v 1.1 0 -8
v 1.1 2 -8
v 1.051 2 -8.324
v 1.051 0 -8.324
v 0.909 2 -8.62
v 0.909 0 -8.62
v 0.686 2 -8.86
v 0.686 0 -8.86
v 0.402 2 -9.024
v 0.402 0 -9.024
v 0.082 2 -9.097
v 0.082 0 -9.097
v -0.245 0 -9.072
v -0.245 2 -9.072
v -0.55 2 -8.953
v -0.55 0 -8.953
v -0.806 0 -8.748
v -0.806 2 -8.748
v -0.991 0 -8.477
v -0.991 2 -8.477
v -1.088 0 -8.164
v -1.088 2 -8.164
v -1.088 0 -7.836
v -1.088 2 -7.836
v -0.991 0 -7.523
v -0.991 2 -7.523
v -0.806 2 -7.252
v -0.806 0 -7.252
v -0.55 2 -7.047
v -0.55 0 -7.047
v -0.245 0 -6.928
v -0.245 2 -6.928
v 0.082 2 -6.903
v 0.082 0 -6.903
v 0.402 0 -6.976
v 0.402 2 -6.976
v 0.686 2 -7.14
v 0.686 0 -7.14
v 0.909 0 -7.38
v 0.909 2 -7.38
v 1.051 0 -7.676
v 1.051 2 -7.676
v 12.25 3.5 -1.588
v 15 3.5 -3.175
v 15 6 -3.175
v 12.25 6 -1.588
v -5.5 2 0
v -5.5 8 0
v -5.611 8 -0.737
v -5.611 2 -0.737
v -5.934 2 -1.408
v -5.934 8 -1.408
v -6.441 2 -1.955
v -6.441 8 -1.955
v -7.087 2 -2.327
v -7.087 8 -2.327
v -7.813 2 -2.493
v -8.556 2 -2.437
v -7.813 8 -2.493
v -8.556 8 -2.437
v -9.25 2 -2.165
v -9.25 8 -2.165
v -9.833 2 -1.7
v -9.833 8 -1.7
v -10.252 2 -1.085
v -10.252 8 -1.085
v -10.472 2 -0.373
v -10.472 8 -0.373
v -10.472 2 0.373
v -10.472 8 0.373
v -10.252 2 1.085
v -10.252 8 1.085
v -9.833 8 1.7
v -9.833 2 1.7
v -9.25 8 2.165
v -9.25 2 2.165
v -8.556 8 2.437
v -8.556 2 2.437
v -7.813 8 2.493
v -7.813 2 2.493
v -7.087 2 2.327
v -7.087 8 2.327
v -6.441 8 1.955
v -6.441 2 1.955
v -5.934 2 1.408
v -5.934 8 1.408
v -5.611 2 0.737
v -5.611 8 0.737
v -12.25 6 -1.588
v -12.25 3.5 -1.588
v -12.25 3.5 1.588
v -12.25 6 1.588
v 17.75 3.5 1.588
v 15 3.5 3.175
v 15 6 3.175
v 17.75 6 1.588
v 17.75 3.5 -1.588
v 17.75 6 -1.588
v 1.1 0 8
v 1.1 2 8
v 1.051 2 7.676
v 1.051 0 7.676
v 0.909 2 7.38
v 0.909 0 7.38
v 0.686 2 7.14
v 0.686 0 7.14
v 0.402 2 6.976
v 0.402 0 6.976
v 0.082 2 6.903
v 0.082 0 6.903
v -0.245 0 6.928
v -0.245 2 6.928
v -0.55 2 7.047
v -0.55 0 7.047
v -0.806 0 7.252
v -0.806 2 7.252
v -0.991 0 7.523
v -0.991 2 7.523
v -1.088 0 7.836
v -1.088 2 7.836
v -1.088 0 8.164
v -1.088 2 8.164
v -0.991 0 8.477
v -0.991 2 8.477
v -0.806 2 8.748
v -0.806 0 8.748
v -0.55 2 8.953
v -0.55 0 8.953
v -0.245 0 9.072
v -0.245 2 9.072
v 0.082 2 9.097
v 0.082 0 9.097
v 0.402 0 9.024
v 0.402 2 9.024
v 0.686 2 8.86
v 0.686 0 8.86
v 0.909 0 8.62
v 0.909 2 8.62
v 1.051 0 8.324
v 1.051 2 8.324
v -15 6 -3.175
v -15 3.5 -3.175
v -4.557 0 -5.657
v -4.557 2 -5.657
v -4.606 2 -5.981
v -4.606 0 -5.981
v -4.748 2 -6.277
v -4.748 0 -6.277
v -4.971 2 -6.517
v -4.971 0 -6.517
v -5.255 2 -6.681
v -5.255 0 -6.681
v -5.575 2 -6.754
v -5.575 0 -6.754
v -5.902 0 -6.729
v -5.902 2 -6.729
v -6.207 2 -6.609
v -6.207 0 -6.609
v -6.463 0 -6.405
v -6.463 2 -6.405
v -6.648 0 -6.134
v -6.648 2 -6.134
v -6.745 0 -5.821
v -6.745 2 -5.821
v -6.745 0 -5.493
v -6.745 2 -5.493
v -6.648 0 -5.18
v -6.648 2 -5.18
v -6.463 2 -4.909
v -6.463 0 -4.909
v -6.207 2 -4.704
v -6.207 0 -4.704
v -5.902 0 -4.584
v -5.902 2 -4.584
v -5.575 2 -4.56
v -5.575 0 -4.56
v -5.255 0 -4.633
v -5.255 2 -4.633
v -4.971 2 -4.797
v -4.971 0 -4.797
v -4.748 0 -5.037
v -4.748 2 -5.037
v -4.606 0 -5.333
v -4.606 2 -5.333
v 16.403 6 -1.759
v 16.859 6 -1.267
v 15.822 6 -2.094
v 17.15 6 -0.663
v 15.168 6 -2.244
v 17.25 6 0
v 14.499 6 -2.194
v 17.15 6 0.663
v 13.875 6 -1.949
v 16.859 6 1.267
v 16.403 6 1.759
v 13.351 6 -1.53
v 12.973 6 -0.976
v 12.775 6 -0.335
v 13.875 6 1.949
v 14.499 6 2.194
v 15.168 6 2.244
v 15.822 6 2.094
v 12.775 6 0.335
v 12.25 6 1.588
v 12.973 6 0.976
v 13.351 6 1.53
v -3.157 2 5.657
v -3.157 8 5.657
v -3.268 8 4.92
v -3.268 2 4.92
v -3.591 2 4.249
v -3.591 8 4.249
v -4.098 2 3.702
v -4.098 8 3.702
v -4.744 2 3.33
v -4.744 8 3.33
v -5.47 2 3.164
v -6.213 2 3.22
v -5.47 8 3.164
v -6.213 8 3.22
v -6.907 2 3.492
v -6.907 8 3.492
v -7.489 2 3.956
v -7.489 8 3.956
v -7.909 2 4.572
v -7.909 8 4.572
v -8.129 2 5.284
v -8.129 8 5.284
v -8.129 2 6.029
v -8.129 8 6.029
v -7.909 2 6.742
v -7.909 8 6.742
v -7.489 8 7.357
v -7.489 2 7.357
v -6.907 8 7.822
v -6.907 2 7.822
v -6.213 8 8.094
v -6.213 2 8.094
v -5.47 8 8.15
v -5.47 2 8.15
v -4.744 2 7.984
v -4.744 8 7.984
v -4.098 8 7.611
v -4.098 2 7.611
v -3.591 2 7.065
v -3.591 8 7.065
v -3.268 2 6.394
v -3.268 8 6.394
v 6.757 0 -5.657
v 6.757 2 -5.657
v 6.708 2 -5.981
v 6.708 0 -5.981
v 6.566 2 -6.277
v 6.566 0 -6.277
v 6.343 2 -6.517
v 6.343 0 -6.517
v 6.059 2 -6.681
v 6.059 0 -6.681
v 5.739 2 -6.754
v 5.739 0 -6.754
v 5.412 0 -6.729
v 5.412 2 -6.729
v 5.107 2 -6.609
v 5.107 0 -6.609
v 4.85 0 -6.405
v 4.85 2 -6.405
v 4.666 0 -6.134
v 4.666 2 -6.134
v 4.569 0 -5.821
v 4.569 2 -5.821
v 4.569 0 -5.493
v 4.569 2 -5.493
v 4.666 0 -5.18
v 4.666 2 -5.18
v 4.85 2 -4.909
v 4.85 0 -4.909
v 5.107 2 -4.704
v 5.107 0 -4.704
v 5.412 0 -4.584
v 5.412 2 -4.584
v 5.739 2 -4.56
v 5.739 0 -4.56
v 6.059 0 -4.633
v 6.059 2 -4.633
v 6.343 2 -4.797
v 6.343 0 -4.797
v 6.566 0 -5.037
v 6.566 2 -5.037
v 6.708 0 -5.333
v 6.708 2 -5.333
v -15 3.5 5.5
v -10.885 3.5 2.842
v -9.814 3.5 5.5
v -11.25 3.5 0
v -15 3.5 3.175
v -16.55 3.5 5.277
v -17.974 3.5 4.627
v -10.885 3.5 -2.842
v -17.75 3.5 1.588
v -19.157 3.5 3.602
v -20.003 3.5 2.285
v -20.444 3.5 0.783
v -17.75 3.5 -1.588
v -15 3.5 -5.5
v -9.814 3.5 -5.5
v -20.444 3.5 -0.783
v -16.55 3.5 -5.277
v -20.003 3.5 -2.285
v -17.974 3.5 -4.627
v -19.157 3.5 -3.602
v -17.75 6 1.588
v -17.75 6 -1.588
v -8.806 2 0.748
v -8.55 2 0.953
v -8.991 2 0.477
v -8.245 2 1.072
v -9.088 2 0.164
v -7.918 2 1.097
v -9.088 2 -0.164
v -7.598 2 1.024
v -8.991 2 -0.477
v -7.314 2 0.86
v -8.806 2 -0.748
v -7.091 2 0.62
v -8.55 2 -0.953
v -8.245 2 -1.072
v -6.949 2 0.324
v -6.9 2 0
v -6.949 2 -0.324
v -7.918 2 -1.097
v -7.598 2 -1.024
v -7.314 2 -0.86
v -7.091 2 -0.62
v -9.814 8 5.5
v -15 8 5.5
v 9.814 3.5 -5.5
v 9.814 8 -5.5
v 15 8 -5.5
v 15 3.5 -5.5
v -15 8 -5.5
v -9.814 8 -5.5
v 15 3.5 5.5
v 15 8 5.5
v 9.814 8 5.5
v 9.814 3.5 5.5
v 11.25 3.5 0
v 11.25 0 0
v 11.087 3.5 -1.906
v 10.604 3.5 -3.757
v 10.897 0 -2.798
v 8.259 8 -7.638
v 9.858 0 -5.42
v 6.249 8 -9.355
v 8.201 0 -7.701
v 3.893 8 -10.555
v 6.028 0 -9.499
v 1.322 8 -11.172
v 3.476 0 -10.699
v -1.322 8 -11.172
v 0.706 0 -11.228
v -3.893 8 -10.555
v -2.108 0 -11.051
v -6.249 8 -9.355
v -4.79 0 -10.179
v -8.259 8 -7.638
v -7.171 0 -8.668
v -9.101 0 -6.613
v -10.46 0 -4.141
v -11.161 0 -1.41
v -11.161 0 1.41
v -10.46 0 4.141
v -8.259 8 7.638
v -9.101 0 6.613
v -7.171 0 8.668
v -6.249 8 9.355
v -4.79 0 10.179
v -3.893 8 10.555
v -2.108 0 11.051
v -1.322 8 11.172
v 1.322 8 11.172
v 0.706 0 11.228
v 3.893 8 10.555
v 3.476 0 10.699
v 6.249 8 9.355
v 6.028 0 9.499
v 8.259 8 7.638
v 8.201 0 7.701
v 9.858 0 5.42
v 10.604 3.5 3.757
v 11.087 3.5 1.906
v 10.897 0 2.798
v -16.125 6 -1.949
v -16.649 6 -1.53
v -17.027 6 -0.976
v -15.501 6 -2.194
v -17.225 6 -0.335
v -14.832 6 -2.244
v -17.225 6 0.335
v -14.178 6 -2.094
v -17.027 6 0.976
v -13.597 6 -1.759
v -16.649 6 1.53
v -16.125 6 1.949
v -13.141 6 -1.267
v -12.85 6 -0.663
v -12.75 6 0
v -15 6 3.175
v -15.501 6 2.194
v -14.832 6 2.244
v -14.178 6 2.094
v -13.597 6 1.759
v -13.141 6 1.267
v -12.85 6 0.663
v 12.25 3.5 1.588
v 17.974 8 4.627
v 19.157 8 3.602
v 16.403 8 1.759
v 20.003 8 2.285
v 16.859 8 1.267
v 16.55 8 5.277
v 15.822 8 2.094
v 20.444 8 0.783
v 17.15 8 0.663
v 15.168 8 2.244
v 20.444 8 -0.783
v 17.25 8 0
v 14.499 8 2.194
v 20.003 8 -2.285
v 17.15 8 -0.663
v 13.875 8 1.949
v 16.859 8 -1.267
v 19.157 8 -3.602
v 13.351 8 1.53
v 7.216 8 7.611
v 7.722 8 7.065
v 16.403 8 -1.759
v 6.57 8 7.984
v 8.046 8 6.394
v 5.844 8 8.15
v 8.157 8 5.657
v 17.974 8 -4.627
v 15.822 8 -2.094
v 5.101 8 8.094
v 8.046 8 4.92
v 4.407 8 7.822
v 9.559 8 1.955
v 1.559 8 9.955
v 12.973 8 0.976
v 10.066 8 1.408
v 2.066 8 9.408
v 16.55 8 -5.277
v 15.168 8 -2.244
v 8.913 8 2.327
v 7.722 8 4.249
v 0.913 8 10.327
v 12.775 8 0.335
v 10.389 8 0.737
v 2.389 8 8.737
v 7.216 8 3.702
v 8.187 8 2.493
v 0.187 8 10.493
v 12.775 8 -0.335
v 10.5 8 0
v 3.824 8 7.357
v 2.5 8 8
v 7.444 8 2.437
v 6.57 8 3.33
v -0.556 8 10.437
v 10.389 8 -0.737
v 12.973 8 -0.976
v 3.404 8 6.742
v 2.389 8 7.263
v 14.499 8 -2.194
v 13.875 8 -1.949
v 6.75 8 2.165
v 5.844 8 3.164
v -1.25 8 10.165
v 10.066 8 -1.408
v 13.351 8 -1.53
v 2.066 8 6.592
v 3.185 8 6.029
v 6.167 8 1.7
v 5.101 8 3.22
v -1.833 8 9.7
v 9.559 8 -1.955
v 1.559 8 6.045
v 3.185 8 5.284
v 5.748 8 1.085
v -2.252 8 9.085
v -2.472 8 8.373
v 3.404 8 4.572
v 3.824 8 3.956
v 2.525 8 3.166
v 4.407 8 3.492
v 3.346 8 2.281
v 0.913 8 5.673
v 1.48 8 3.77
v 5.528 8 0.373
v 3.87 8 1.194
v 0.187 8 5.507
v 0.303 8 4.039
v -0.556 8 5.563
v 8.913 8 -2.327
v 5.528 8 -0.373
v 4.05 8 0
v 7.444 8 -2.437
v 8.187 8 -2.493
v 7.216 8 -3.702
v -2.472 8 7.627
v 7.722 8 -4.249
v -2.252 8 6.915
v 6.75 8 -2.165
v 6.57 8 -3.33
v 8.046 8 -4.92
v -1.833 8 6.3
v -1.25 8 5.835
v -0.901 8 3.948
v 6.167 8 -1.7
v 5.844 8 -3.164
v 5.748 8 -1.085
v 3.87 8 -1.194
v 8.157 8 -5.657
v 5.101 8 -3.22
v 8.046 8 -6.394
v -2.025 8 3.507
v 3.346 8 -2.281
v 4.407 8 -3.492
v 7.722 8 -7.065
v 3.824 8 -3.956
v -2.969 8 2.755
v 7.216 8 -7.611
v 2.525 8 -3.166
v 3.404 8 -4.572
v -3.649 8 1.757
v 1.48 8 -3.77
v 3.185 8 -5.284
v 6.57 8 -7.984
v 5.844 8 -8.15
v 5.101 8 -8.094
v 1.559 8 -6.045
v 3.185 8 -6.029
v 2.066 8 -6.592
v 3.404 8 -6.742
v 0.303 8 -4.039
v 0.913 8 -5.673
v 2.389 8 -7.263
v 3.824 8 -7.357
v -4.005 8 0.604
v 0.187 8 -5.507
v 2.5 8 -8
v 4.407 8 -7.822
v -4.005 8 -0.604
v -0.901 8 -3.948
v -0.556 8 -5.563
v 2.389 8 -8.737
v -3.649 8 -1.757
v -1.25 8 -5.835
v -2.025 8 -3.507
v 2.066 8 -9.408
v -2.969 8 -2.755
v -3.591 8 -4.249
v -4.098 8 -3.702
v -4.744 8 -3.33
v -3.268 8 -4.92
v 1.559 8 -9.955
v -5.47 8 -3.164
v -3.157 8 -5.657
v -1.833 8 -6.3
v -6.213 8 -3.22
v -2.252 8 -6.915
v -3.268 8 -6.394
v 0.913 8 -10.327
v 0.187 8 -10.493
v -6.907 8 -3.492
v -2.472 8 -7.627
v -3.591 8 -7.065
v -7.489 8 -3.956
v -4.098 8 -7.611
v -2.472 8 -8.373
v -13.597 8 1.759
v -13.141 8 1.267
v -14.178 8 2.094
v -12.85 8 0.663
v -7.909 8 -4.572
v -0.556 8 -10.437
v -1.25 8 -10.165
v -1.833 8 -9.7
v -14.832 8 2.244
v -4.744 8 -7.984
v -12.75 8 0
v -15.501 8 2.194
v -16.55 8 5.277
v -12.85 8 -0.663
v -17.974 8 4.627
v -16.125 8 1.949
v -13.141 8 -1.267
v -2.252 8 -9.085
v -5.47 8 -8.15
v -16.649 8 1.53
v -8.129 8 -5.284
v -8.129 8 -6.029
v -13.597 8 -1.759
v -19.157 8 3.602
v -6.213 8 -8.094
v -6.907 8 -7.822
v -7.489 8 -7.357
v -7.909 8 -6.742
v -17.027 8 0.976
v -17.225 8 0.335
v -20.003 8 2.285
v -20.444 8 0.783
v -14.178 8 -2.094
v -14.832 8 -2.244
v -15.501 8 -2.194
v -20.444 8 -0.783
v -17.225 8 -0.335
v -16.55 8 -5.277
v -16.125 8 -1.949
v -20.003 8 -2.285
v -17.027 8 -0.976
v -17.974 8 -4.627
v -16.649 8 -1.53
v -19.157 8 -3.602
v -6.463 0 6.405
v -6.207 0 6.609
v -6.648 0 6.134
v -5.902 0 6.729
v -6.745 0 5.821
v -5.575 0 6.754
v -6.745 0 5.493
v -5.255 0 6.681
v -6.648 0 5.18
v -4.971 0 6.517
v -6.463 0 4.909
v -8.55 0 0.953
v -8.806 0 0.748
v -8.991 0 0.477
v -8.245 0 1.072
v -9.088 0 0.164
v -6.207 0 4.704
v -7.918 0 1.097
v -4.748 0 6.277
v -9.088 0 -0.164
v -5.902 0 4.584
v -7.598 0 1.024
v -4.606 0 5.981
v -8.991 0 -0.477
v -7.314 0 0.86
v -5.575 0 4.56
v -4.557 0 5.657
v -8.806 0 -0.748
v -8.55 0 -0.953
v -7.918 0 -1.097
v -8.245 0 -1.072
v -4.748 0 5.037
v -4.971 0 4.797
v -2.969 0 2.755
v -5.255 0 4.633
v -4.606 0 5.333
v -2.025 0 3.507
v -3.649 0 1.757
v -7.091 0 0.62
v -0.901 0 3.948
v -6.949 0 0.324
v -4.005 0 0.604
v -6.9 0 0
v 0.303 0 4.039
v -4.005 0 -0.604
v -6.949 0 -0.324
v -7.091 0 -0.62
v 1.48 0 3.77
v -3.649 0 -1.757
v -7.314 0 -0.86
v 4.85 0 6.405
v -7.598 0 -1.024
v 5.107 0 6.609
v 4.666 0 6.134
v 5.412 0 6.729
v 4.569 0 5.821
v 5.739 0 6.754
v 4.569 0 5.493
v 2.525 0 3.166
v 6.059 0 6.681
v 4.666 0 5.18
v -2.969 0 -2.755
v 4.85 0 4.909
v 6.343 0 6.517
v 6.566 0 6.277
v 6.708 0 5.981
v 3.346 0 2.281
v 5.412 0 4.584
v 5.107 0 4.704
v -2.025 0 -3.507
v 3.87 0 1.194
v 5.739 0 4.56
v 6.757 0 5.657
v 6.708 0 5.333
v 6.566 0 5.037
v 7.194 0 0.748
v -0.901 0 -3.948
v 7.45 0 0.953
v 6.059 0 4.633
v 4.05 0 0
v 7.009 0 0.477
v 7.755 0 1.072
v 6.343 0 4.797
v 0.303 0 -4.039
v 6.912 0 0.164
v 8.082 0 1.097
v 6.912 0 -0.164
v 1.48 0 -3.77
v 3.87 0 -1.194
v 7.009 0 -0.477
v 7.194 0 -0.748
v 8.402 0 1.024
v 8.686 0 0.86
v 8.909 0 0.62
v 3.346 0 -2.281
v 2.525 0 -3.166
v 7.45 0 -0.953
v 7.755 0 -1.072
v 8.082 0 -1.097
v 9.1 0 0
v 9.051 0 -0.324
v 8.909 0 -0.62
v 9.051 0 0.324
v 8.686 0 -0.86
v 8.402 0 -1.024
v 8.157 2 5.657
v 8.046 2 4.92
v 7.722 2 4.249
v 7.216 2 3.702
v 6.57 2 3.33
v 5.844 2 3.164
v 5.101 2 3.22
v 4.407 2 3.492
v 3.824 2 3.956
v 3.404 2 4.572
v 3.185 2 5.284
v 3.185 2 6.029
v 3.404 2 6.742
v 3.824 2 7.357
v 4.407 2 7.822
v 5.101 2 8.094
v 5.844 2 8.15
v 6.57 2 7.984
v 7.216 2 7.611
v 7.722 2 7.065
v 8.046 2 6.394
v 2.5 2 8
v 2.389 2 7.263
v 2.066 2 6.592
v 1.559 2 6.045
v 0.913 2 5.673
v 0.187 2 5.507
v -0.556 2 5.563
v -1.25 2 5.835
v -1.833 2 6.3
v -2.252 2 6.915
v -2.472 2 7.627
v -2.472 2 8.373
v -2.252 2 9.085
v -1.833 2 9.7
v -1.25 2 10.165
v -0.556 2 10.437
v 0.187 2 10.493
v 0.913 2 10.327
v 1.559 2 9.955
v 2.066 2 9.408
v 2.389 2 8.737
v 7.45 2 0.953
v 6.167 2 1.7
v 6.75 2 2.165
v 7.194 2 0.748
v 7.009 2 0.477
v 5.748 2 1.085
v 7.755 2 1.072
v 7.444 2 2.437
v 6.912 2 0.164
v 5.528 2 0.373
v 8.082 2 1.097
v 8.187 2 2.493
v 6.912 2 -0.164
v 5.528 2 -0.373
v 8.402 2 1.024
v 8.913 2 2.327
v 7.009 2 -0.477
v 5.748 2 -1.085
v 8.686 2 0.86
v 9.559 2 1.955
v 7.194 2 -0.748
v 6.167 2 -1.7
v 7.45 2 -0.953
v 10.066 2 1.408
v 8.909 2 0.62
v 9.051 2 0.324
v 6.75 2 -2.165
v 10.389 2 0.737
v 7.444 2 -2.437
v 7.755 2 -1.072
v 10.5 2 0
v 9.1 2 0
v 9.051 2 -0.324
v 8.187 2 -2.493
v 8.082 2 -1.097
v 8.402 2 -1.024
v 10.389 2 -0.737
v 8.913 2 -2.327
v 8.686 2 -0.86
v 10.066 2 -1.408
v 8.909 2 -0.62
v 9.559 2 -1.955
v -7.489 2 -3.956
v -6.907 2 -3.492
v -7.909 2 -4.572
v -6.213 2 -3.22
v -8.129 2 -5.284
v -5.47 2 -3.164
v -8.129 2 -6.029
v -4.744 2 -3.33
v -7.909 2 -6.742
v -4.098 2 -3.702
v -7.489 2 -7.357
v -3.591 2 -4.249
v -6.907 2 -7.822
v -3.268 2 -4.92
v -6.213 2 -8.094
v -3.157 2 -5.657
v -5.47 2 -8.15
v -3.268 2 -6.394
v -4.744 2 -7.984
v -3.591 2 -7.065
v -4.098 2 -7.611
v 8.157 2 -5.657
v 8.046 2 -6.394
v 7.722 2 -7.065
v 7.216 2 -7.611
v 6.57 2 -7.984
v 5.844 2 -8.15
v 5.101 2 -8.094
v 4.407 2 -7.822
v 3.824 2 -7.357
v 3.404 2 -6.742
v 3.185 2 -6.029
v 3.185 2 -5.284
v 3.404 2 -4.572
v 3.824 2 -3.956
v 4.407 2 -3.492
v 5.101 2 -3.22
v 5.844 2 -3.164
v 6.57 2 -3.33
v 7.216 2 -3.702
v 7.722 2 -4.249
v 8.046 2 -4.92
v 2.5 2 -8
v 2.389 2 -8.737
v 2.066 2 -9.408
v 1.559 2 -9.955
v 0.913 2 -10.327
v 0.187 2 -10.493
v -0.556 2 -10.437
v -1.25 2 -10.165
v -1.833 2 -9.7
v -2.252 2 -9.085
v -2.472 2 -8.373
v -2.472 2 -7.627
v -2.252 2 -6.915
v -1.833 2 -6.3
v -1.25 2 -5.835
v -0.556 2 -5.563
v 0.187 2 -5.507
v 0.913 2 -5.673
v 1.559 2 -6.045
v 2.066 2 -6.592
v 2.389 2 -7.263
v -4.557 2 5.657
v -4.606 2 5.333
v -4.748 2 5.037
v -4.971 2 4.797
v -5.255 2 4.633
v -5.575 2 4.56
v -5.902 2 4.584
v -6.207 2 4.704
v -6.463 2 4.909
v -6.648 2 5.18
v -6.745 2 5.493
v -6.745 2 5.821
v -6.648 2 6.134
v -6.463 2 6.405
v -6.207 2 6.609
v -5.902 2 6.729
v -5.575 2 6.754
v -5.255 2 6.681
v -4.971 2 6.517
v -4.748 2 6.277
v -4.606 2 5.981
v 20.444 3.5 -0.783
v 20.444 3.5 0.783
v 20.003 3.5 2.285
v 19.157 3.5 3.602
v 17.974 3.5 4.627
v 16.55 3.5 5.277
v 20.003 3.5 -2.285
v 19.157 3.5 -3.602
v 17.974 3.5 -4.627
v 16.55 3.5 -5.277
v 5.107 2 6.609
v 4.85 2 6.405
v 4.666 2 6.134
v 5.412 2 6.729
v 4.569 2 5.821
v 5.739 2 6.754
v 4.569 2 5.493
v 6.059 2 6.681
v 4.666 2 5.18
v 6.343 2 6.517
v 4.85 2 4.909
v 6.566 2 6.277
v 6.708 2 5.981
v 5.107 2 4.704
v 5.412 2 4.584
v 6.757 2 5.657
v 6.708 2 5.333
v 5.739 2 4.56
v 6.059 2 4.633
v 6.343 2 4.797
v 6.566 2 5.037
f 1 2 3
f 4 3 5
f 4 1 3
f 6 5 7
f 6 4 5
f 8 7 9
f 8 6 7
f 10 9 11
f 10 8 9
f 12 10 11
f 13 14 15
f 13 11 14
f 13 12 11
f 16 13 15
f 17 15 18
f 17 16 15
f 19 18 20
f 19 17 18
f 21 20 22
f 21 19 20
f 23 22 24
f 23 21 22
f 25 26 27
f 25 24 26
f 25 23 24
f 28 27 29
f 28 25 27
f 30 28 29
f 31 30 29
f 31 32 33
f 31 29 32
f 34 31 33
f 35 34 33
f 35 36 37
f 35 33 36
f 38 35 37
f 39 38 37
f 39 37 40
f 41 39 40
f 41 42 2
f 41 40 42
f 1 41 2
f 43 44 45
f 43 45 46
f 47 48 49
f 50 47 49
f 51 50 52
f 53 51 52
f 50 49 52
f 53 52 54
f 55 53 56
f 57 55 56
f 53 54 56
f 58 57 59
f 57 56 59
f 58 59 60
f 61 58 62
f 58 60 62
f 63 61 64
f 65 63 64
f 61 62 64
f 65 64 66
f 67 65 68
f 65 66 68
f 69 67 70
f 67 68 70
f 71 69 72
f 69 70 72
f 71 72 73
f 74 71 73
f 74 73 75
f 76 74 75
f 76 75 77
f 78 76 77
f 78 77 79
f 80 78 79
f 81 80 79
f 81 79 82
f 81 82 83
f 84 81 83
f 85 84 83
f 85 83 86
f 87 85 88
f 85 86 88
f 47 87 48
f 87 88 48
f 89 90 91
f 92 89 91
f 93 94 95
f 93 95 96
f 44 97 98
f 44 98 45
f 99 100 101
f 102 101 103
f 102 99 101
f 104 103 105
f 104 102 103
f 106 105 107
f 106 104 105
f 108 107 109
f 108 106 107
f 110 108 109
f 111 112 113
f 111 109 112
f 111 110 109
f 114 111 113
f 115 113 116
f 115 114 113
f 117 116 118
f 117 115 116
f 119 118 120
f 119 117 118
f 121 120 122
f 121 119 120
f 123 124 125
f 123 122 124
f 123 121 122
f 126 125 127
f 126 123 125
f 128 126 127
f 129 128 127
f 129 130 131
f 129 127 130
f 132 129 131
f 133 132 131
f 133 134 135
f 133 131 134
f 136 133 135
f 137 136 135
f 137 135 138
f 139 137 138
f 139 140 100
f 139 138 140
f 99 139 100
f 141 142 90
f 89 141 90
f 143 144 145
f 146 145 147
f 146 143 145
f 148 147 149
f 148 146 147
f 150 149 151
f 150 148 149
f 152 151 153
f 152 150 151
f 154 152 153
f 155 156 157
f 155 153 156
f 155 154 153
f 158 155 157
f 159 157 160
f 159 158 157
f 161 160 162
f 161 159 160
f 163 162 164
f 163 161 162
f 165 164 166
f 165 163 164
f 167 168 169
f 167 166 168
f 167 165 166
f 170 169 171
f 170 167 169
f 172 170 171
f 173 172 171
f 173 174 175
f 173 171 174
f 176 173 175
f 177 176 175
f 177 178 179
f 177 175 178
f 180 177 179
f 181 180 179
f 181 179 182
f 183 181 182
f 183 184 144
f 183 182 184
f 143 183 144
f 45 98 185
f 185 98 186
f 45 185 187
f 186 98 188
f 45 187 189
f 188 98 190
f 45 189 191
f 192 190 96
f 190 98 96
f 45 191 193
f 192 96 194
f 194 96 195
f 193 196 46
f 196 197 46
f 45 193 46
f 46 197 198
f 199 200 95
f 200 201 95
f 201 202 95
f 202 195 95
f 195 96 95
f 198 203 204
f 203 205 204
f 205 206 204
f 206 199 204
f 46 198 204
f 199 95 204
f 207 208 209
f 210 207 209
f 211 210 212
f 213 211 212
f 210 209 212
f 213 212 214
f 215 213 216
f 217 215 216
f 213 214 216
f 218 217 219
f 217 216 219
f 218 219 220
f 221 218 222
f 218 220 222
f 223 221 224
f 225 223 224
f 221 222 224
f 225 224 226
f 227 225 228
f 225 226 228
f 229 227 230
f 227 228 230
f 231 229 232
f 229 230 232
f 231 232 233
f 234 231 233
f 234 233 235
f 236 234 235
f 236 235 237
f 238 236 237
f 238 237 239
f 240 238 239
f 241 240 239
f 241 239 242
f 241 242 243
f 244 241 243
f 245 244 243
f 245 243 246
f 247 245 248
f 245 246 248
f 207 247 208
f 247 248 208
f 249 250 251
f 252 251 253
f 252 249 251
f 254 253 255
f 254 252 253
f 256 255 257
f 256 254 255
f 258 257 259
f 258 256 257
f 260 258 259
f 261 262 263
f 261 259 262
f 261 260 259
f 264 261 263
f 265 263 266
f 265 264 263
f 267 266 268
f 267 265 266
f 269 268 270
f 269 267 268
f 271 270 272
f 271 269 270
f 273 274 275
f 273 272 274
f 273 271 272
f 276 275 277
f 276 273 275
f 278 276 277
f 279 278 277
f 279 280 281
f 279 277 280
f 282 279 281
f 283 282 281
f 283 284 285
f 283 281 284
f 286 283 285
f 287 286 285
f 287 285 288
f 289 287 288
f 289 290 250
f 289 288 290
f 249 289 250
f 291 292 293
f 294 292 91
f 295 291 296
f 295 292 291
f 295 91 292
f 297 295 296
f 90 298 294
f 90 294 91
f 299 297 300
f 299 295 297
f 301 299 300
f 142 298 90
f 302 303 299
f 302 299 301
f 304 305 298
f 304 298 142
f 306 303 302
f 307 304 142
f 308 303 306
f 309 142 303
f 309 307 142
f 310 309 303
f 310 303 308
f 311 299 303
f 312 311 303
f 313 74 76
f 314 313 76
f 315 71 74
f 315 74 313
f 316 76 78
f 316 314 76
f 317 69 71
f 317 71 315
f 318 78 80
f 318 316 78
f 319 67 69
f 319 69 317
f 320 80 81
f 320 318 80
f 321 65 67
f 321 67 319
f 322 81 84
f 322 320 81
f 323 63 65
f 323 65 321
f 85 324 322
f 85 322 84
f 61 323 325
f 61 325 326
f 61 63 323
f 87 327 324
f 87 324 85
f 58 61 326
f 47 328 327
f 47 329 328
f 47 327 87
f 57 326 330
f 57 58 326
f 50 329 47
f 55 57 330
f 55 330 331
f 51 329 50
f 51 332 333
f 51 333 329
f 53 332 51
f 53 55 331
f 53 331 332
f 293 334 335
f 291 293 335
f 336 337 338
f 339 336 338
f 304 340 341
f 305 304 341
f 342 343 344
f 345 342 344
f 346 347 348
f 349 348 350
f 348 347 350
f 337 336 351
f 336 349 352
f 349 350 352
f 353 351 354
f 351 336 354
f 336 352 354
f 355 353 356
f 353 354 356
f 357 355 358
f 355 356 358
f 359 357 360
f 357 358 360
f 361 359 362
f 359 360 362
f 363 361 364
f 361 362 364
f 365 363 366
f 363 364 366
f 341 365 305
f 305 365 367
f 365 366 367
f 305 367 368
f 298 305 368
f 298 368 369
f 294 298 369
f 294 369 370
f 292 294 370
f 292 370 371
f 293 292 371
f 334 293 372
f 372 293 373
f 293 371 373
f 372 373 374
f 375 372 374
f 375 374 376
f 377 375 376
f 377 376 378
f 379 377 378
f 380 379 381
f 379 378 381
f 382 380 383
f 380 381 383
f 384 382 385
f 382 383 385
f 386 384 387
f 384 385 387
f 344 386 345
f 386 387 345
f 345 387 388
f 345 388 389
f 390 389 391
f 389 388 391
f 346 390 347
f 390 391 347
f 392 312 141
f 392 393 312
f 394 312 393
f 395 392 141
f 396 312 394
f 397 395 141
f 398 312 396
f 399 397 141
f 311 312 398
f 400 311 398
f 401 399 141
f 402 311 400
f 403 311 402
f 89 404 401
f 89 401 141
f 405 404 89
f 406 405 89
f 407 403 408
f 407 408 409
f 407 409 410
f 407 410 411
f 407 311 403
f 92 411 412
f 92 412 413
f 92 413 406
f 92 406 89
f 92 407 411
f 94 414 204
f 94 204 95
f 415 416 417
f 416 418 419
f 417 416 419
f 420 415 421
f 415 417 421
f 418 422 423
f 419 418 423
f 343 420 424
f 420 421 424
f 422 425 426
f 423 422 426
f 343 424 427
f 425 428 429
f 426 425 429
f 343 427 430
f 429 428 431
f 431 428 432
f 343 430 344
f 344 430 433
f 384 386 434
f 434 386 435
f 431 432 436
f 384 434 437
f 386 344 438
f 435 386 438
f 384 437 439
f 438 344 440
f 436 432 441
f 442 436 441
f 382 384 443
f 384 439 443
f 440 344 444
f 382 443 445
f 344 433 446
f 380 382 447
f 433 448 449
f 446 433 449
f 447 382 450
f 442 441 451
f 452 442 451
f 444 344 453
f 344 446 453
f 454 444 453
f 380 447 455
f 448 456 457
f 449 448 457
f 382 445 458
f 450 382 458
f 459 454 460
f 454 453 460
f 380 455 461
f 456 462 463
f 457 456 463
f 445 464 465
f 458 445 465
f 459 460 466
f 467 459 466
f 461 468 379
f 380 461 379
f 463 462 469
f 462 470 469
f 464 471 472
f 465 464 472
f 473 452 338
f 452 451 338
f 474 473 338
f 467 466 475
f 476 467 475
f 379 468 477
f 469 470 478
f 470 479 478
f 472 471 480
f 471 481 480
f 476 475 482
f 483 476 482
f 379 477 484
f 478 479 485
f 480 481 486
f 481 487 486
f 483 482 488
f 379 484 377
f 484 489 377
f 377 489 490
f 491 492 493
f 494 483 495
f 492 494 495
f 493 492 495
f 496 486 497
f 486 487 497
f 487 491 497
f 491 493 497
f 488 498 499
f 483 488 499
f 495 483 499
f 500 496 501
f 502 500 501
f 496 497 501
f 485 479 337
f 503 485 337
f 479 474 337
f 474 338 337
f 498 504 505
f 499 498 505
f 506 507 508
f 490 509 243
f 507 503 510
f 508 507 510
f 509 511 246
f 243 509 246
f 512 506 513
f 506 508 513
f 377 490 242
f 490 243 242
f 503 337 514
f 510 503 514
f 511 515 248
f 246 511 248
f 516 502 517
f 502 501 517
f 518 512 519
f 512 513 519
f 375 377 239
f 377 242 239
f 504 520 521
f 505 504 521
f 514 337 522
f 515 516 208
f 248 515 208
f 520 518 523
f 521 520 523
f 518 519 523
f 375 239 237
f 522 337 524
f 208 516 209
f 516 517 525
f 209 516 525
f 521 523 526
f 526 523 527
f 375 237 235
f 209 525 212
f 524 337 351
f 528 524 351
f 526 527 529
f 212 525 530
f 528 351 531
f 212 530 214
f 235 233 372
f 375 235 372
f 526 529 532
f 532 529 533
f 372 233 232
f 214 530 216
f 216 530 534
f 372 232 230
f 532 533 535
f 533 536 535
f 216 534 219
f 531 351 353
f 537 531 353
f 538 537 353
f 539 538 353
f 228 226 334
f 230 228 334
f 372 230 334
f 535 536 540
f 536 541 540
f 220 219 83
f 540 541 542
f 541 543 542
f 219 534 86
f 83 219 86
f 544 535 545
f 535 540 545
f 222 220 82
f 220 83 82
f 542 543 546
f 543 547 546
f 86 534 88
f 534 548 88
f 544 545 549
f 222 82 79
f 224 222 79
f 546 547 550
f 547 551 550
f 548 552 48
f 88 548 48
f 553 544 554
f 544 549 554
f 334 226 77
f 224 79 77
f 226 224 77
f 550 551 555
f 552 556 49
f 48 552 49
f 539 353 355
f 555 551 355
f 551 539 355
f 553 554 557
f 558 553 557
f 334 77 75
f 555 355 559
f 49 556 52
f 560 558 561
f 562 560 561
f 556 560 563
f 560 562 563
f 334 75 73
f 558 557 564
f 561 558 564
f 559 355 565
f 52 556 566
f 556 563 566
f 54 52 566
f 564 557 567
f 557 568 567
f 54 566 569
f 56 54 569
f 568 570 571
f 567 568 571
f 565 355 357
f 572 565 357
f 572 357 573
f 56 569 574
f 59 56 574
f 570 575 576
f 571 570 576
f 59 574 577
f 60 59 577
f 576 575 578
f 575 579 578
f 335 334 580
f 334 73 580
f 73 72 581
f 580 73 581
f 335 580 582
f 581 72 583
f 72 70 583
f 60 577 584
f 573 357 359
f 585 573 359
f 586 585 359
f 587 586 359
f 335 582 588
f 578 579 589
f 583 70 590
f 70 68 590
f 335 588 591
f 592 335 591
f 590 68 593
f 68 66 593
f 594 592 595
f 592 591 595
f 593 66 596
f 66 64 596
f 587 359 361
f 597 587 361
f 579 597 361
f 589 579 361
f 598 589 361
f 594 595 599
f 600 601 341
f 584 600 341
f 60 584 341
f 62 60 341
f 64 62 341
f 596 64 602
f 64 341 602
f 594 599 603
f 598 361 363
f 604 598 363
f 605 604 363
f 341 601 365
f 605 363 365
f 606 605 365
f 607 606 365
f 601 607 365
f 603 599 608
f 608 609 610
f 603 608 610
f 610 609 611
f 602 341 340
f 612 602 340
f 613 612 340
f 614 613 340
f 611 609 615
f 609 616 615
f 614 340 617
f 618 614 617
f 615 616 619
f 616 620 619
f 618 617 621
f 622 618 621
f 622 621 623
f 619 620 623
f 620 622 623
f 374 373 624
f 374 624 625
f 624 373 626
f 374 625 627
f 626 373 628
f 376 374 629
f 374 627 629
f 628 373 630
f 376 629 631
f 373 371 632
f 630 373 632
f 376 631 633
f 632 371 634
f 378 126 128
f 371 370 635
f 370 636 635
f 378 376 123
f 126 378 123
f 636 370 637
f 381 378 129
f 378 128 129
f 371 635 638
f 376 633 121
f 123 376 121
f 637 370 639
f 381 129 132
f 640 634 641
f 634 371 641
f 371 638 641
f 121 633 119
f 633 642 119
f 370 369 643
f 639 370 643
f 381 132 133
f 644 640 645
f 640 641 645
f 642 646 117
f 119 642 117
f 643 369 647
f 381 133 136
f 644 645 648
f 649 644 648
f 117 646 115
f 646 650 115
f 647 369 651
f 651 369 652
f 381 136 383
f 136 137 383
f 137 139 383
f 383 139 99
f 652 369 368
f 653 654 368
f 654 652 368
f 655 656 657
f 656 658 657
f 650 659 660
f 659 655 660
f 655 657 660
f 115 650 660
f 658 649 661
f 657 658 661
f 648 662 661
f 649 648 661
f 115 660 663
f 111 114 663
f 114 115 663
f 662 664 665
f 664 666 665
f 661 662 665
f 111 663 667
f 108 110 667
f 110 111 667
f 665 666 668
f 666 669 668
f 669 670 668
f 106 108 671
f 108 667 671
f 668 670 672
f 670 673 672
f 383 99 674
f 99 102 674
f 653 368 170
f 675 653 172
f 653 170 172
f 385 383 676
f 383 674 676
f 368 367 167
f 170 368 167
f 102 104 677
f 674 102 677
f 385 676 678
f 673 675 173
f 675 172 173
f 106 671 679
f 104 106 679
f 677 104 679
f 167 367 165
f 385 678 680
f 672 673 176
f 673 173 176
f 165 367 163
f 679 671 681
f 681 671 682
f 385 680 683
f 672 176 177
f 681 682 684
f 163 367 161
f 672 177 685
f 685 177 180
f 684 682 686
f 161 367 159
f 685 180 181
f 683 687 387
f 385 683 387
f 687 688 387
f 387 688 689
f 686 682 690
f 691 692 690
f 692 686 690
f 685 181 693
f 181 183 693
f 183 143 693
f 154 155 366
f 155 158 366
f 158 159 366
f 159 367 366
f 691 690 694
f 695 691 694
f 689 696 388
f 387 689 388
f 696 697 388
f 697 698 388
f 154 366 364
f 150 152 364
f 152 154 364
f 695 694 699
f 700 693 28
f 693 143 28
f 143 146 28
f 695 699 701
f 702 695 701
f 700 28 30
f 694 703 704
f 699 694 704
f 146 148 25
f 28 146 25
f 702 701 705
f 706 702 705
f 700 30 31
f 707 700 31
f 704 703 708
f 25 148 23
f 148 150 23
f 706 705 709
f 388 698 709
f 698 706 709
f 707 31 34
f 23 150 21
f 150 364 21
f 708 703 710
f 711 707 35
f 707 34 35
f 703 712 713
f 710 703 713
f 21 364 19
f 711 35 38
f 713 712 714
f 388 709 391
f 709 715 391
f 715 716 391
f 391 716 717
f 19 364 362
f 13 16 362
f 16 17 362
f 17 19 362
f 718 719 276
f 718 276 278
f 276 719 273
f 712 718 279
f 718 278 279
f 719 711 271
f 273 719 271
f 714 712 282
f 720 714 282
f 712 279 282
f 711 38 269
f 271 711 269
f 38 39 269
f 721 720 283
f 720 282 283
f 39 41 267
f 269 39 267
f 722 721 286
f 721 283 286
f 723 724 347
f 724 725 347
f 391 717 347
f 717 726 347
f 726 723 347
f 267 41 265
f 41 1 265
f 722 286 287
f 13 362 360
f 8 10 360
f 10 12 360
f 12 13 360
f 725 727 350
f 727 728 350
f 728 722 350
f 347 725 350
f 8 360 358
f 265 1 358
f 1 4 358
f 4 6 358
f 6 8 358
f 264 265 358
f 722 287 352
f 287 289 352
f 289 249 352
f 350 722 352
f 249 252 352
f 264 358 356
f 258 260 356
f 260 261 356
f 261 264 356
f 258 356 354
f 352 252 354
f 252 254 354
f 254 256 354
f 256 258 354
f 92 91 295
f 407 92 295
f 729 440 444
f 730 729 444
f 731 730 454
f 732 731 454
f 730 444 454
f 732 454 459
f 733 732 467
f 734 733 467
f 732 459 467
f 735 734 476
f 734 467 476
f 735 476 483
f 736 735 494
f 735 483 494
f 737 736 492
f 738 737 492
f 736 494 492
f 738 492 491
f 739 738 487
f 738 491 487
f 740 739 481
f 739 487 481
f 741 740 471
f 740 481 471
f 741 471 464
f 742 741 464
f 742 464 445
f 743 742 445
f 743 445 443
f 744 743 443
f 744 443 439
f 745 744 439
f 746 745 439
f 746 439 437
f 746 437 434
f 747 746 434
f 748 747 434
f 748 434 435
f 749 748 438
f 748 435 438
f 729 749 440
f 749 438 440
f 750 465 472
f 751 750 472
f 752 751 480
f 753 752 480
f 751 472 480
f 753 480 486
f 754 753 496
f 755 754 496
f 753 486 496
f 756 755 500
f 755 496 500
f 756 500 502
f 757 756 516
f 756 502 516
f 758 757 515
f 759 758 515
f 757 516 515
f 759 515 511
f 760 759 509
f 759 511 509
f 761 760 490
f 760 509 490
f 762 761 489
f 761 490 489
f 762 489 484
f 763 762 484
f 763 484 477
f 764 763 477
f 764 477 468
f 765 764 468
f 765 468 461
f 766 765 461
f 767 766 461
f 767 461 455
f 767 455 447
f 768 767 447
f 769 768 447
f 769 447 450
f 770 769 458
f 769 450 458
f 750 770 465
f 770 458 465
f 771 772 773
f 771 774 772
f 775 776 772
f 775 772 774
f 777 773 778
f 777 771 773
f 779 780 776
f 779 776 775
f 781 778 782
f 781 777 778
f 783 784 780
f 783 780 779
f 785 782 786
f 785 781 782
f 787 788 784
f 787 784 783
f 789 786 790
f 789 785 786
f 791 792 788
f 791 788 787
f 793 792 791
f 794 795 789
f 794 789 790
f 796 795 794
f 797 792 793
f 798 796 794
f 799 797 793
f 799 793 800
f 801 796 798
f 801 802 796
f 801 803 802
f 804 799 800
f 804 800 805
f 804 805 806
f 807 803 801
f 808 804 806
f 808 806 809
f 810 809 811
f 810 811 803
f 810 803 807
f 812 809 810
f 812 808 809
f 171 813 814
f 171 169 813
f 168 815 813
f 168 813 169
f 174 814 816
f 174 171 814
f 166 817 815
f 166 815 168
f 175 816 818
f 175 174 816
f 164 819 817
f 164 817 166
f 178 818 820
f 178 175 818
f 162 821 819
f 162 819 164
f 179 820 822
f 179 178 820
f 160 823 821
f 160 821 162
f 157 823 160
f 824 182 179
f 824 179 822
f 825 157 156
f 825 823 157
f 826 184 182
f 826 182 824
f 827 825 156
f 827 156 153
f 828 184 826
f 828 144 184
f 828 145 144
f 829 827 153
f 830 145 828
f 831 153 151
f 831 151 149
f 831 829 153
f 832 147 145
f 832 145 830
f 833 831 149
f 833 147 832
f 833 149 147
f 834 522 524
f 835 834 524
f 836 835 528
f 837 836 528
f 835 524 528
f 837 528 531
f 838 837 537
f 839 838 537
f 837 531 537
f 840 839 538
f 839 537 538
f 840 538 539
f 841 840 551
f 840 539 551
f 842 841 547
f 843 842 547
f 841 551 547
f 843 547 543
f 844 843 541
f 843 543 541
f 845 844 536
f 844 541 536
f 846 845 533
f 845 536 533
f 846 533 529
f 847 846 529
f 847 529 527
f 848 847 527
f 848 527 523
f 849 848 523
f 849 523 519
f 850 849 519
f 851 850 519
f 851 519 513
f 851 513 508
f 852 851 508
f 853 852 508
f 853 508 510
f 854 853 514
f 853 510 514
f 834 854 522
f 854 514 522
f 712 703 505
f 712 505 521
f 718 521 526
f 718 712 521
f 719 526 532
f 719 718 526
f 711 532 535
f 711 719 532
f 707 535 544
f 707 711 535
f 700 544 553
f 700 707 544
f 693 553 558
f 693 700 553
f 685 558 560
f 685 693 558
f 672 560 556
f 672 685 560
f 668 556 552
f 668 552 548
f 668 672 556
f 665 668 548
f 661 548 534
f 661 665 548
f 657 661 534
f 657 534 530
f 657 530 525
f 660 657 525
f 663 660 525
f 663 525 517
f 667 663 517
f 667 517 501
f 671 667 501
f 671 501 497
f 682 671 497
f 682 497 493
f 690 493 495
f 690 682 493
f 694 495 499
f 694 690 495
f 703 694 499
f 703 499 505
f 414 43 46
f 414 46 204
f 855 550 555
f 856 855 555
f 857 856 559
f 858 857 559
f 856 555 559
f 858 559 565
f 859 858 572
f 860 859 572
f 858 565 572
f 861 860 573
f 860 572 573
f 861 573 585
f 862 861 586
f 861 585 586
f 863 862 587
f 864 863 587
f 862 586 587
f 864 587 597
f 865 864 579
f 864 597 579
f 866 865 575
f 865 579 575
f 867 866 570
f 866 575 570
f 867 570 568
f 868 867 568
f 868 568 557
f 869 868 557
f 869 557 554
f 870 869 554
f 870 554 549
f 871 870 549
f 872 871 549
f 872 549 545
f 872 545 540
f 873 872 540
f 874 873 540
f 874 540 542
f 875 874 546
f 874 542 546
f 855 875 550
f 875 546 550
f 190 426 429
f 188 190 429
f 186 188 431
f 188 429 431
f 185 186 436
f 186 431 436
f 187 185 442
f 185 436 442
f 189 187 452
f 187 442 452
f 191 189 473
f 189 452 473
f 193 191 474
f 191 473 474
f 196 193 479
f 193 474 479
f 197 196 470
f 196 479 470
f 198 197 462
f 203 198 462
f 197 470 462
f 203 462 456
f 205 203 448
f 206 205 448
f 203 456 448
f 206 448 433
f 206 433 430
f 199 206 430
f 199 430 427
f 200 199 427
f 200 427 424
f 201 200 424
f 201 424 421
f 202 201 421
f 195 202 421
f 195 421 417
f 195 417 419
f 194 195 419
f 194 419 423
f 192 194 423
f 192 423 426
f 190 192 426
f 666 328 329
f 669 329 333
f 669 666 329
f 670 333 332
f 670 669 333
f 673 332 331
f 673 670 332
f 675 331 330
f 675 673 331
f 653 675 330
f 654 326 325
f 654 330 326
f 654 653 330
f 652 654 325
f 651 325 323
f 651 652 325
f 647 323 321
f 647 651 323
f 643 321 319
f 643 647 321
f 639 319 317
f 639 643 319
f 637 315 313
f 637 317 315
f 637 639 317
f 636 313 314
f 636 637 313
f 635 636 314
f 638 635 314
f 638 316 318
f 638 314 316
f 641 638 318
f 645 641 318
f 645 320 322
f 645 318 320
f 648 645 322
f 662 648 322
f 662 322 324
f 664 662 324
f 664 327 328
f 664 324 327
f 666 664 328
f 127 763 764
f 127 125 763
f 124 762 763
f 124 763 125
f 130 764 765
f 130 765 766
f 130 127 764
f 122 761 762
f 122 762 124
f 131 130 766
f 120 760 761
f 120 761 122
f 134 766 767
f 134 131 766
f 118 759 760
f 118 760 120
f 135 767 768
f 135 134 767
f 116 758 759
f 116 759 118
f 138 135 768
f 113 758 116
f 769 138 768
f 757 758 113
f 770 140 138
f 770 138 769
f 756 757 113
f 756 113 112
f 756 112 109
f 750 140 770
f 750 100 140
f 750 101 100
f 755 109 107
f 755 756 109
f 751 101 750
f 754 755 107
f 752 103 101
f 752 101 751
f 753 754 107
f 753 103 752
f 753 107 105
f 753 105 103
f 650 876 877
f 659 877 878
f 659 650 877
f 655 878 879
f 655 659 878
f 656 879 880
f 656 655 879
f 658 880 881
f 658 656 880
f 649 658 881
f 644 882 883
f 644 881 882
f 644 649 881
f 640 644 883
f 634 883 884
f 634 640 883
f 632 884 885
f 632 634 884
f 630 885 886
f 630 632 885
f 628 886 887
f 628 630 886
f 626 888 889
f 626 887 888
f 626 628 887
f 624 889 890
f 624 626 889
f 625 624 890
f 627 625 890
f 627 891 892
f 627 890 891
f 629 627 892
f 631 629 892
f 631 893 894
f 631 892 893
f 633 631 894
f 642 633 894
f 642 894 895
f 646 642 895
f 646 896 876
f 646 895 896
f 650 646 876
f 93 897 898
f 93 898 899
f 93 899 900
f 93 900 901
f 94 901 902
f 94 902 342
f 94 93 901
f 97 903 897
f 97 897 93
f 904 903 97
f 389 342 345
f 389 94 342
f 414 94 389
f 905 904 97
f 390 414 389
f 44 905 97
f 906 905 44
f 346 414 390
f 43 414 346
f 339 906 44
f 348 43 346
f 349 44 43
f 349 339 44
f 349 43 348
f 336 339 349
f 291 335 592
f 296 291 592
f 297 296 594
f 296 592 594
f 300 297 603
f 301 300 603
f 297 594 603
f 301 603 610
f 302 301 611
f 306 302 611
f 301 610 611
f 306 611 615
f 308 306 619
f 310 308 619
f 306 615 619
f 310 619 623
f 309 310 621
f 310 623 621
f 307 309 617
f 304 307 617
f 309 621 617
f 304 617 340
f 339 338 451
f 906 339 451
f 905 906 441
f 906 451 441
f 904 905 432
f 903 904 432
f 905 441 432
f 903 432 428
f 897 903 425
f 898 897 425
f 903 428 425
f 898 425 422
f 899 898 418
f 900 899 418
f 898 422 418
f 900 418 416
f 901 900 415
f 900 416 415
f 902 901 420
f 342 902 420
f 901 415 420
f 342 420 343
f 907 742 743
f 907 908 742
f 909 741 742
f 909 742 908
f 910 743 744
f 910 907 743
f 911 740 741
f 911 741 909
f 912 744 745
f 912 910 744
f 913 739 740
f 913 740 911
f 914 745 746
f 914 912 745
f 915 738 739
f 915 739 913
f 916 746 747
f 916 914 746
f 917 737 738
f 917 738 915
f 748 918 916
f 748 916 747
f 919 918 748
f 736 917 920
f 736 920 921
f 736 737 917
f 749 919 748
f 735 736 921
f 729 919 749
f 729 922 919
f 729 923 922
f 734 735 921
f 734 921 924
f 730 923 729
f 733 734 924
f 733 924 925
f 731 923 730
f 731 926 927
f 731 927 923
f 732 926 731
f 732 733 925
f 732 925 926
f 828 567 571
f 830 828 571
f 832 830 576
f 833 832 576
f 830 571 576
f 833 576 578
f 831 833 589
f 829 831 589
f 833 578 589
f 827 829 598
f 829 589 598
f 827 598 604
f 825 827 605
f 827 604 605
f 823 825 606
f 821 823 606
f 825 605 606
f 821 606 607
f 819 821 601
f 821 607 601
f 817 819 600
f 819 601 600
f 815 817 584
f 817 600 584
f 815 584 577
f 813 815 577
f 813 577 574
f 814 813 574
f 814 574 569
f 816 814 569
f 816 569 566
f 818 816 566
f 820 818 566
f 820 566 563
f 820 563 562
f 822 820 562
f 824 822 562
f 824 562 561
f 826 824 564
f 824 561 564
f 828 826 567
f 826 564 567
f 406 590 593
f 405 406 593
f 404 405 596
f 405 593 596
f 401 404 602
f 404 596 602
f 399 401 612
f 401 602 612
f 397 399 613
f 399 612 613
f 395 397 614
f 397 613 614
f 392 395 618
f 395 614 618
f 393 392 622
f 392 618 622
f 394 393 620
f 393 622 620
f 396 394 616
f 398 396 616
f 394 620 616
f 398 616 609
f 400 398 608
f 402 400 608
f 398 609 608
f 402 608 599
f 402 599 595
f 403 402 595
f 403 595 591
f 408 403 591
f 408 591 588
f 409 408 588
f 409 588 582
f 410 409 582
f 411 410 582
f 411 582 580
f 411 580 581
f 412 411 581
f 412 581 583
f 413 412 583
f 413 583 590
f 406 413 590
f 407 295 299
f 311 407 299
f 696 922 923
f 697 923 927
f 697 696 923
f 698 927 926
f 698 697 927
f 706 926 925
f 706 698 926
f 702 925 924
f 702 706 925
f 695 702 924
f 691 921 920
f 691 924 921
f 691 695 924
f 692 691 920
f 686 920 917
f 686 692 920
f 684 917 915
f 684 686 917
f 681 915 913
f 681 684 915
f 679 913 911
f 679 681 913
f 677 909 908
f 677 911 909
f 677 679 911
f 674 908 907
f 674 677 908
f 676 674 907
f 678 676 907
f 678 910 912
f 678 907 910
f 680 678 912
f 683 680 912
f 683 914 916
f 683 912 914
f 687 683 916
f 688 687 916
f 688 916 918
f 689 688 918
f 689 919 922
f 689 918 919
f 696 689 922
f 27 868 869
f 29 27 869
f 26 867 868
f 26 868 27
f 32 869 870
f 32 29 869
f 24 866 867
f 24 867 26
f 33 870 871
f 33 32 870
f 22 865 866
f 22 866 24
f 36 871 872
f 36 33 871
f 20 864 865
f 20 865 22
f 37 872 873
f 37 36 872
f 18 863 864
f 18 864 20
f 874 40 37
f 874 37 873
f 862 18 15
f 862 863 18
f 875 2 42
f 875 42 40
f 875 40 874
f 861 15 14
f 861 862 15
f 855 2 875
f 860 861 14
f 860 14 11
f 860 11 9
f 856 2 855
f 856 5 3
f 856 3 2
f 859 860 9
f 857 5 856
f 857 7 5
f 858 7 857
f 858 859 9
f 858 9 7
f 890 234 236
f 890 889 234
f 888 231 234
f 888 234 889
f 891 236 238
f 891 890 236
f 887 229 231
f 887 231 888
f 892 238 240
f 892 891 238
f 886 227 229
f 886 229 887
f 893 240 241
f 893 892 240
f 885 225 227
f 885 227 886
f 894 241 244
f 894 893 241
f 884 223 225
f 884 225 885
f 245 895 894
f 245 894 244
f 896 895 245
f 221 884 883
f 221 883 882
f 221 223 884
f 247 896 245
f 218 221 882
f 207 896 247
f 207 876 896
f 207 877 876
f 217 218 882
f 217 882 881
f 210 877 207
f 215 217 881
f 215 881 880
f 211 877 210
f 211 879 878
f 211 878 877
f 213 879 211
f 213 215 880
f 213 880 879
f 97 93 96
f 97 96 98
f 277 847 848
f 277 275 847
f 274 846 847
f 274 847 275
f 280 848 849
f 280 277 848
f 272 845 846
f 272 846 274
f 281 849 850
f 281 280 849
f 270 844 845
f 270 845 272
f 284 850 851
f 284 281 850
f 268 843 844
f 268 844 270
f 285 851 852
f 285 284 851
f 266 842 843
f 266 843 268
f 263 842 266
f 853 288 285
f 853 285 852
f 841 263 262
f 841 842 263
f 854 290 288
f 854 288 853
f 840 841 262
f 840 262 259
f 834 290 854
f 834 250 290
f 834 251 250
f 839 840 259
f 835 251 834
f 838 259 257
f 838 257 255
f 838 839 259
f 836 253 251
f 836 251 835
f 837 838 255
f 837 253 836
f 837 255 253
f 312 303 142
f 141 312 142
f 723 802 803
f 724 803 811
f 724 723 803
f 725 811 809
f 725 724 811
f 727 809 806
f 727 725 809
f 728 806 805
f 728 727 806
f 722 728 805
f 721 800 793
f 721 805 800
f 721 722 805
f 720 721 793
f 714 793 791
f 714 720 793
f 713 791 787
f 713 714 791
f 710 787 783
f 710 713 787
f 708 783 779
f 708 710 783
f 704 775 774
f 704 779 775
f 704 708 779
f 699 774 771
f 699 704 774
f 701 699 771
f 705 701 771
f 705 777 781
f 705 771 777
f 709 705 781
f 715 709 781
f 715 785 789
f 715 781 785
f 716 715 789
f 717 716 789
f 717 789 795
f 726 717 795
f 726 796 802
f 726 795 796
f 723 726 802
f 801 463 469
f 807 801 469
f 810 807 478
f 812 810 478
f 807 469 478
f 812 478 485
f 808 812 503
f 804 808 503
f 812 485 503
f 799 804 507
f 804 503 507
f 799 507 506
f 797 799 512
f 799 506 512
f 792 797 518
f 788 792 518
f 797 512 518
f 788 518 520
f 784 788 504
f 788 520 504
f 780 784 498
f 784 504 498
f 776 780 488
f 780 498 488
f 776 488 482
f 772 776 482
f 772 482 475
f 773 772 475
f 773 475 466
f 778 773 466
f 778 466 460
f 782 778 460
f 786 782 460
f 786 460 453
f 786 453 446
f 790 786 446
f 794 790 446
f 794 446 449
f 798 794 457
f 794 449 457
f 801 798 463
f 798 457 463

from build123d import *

# Parameters (mm, degrees)
SKETCH1_R           = 11.25
SKETCH1_R_2         = 1.1
SKETCH1_R_3         = 4.05
BOSS_EXTRUDE1_DEPTH = 8
SKETCH2_R           = 2.5
CUT_EXTRUDE1_DEPTH  = 6
SKETCH3_R           = 2.25
BOSS_EXTRUDE2_DEPTH = 4.5
CUT_EXTRUDE2_DEPTH  = 2.5


with BuildPart() as part:
    # Sketch1 → Boss-Extrude1 (new body)
    with BuildSketch(Plane(origin=(0, 0, 0), x_dir=(1, 0, 0), z_dir=(0, 1, 0))):
        Circle(SKETCH1_R)
        with Locations((0, 8)):
            Circle(SKETCH1_R_2, mode=Mode.SUBTRACT)
        with Locations((5.656854249, 5.656854249)):
            Circle(SKETCH1_R_2, mode=Mode.SUBTRACT)
        with Locations((8, 0)):
            Circle(SKETCH1_R_2, mode=Mode.SUBTRACT)
        with Locations((5.656854249, -5.656854249)):
            Circle(SKETCH1_R_2, mode=Mode.SUBTRACT)
        with Locations((0, -8)):
            Circle(SKETCH1_R_2, mode=Mode.SUBTRACT)
        with Locations((-5.656854249, -5.656854249)):
            Circle(SKETCH1_R_2, mode=Mode.SUBTRACT)
        with Locations((-8, 0)):
            Circle(SKETCH1_R_2, mode=Mode.SUBTRACT)
        with Locations((-5.656854249, 5.656854249)):
            Circle(SKETCH1_R_2, mode=Mode.SUBTRACT)
        Circle(SKETCH1_R_3, mode=Mode.SUBTRACT)
    extrude(amount=BOSS_EXTRUDE1_DEPTH)

    # Sketch2 → Cut-Extrude1 (cut)
    with BuildSketch(Plane(origin=(0, 8, 0), x_dir=(1, 0, 0), z_dir=(0, 1, 0))):
        with Locations((0, 8)):
            Circle(SKETCH2_R)
        with Locations((5.656854249, 5.656854249)):
            Circle(SKETCH2_R)
        with Locations((8, 0)):
            Circle(SKETCH2_R)
        with Locations((5.656854249, -5.656854249)):
            Circle(SKETCH2_R)
        with Locations((0, -8)):
            Circle(SKETCH2_R)
        with Locations((-5.656854249, -5.656854249)):
            Circle(SKETCH2_R)
        with Locations((-8, 0)):
            Circle(SKETCH2_R)
        with Locations((-5.656854249, 5.656854249)):
            Circle(SKETCH2_R)
    extrude(amount=-CUT_EXTRUDE1_DEPTH, mode=Mode.SUBTRACT)

    # Sketch3 → Boss-Extrude2 (add)
    with BuildSketch(Plane(origin=(0, 8, 0), x_dir=(1, 0, 0), z_dir=(0, 1, 0))):
        with BuildLine():
            Line((-15, 5.5), (-9.813893213, 5.5))
            ThreePointArc((-9.813893213, 5.5), (-11.25, 0), (-9.813893213, -5.5))
            Line((-9.813893213, -5.5), (-15, -5.5))
            ThreePointArc((-15, -5.5), (-20.5, 0), (-15, 5.5))
        make_face()
        with Locations((-15, 0)):
            Circle(SKETCH3_R, mode=Mode.SUBTRACT)
        with BuildLine():
            Line((9.813893213, 5.5), (15, 5.5))
            ThreePointArc((15, 5.5), (20.5, 0), (15, -5.5))
            Line((15, -5.5), (9.813893213, -5.5))
            ThreePointArc((9.813893213, -5.5), (11.25, 0), (9.813893213, 5.5))
        make_face()
        with Locations((15, 0)):
            Circle(SKETCH3_R, mode=Mode.SUBTRACT)
    extrude(amount=-BOSS_EXTRUDE2_DEPTH)

    # Sketch4 → Cut-Extrude2 (cut)
    with BuildSketch(Plane.XZ.offset(-3.5)):
        Polygon((-15, 3.175426481), (-17.75, 1.58771324), (-17.75, -1.58771324), (-15, -3.175426481), (-12.25, -1.58771324), (-12.25, 1.58771324), align=None)
        Polygon((12.25, 1.58771324), (15, 3.175426481), (17.75, 1.58771324), (17.75, -1.58771324), (15, -3.175426481), (12.25, -1.58771324), align=None)
    extrude(amount=-CUT_EXTRUDE2_DEPTH, mode=Mode.SUBTRACT)


solid = part.part
